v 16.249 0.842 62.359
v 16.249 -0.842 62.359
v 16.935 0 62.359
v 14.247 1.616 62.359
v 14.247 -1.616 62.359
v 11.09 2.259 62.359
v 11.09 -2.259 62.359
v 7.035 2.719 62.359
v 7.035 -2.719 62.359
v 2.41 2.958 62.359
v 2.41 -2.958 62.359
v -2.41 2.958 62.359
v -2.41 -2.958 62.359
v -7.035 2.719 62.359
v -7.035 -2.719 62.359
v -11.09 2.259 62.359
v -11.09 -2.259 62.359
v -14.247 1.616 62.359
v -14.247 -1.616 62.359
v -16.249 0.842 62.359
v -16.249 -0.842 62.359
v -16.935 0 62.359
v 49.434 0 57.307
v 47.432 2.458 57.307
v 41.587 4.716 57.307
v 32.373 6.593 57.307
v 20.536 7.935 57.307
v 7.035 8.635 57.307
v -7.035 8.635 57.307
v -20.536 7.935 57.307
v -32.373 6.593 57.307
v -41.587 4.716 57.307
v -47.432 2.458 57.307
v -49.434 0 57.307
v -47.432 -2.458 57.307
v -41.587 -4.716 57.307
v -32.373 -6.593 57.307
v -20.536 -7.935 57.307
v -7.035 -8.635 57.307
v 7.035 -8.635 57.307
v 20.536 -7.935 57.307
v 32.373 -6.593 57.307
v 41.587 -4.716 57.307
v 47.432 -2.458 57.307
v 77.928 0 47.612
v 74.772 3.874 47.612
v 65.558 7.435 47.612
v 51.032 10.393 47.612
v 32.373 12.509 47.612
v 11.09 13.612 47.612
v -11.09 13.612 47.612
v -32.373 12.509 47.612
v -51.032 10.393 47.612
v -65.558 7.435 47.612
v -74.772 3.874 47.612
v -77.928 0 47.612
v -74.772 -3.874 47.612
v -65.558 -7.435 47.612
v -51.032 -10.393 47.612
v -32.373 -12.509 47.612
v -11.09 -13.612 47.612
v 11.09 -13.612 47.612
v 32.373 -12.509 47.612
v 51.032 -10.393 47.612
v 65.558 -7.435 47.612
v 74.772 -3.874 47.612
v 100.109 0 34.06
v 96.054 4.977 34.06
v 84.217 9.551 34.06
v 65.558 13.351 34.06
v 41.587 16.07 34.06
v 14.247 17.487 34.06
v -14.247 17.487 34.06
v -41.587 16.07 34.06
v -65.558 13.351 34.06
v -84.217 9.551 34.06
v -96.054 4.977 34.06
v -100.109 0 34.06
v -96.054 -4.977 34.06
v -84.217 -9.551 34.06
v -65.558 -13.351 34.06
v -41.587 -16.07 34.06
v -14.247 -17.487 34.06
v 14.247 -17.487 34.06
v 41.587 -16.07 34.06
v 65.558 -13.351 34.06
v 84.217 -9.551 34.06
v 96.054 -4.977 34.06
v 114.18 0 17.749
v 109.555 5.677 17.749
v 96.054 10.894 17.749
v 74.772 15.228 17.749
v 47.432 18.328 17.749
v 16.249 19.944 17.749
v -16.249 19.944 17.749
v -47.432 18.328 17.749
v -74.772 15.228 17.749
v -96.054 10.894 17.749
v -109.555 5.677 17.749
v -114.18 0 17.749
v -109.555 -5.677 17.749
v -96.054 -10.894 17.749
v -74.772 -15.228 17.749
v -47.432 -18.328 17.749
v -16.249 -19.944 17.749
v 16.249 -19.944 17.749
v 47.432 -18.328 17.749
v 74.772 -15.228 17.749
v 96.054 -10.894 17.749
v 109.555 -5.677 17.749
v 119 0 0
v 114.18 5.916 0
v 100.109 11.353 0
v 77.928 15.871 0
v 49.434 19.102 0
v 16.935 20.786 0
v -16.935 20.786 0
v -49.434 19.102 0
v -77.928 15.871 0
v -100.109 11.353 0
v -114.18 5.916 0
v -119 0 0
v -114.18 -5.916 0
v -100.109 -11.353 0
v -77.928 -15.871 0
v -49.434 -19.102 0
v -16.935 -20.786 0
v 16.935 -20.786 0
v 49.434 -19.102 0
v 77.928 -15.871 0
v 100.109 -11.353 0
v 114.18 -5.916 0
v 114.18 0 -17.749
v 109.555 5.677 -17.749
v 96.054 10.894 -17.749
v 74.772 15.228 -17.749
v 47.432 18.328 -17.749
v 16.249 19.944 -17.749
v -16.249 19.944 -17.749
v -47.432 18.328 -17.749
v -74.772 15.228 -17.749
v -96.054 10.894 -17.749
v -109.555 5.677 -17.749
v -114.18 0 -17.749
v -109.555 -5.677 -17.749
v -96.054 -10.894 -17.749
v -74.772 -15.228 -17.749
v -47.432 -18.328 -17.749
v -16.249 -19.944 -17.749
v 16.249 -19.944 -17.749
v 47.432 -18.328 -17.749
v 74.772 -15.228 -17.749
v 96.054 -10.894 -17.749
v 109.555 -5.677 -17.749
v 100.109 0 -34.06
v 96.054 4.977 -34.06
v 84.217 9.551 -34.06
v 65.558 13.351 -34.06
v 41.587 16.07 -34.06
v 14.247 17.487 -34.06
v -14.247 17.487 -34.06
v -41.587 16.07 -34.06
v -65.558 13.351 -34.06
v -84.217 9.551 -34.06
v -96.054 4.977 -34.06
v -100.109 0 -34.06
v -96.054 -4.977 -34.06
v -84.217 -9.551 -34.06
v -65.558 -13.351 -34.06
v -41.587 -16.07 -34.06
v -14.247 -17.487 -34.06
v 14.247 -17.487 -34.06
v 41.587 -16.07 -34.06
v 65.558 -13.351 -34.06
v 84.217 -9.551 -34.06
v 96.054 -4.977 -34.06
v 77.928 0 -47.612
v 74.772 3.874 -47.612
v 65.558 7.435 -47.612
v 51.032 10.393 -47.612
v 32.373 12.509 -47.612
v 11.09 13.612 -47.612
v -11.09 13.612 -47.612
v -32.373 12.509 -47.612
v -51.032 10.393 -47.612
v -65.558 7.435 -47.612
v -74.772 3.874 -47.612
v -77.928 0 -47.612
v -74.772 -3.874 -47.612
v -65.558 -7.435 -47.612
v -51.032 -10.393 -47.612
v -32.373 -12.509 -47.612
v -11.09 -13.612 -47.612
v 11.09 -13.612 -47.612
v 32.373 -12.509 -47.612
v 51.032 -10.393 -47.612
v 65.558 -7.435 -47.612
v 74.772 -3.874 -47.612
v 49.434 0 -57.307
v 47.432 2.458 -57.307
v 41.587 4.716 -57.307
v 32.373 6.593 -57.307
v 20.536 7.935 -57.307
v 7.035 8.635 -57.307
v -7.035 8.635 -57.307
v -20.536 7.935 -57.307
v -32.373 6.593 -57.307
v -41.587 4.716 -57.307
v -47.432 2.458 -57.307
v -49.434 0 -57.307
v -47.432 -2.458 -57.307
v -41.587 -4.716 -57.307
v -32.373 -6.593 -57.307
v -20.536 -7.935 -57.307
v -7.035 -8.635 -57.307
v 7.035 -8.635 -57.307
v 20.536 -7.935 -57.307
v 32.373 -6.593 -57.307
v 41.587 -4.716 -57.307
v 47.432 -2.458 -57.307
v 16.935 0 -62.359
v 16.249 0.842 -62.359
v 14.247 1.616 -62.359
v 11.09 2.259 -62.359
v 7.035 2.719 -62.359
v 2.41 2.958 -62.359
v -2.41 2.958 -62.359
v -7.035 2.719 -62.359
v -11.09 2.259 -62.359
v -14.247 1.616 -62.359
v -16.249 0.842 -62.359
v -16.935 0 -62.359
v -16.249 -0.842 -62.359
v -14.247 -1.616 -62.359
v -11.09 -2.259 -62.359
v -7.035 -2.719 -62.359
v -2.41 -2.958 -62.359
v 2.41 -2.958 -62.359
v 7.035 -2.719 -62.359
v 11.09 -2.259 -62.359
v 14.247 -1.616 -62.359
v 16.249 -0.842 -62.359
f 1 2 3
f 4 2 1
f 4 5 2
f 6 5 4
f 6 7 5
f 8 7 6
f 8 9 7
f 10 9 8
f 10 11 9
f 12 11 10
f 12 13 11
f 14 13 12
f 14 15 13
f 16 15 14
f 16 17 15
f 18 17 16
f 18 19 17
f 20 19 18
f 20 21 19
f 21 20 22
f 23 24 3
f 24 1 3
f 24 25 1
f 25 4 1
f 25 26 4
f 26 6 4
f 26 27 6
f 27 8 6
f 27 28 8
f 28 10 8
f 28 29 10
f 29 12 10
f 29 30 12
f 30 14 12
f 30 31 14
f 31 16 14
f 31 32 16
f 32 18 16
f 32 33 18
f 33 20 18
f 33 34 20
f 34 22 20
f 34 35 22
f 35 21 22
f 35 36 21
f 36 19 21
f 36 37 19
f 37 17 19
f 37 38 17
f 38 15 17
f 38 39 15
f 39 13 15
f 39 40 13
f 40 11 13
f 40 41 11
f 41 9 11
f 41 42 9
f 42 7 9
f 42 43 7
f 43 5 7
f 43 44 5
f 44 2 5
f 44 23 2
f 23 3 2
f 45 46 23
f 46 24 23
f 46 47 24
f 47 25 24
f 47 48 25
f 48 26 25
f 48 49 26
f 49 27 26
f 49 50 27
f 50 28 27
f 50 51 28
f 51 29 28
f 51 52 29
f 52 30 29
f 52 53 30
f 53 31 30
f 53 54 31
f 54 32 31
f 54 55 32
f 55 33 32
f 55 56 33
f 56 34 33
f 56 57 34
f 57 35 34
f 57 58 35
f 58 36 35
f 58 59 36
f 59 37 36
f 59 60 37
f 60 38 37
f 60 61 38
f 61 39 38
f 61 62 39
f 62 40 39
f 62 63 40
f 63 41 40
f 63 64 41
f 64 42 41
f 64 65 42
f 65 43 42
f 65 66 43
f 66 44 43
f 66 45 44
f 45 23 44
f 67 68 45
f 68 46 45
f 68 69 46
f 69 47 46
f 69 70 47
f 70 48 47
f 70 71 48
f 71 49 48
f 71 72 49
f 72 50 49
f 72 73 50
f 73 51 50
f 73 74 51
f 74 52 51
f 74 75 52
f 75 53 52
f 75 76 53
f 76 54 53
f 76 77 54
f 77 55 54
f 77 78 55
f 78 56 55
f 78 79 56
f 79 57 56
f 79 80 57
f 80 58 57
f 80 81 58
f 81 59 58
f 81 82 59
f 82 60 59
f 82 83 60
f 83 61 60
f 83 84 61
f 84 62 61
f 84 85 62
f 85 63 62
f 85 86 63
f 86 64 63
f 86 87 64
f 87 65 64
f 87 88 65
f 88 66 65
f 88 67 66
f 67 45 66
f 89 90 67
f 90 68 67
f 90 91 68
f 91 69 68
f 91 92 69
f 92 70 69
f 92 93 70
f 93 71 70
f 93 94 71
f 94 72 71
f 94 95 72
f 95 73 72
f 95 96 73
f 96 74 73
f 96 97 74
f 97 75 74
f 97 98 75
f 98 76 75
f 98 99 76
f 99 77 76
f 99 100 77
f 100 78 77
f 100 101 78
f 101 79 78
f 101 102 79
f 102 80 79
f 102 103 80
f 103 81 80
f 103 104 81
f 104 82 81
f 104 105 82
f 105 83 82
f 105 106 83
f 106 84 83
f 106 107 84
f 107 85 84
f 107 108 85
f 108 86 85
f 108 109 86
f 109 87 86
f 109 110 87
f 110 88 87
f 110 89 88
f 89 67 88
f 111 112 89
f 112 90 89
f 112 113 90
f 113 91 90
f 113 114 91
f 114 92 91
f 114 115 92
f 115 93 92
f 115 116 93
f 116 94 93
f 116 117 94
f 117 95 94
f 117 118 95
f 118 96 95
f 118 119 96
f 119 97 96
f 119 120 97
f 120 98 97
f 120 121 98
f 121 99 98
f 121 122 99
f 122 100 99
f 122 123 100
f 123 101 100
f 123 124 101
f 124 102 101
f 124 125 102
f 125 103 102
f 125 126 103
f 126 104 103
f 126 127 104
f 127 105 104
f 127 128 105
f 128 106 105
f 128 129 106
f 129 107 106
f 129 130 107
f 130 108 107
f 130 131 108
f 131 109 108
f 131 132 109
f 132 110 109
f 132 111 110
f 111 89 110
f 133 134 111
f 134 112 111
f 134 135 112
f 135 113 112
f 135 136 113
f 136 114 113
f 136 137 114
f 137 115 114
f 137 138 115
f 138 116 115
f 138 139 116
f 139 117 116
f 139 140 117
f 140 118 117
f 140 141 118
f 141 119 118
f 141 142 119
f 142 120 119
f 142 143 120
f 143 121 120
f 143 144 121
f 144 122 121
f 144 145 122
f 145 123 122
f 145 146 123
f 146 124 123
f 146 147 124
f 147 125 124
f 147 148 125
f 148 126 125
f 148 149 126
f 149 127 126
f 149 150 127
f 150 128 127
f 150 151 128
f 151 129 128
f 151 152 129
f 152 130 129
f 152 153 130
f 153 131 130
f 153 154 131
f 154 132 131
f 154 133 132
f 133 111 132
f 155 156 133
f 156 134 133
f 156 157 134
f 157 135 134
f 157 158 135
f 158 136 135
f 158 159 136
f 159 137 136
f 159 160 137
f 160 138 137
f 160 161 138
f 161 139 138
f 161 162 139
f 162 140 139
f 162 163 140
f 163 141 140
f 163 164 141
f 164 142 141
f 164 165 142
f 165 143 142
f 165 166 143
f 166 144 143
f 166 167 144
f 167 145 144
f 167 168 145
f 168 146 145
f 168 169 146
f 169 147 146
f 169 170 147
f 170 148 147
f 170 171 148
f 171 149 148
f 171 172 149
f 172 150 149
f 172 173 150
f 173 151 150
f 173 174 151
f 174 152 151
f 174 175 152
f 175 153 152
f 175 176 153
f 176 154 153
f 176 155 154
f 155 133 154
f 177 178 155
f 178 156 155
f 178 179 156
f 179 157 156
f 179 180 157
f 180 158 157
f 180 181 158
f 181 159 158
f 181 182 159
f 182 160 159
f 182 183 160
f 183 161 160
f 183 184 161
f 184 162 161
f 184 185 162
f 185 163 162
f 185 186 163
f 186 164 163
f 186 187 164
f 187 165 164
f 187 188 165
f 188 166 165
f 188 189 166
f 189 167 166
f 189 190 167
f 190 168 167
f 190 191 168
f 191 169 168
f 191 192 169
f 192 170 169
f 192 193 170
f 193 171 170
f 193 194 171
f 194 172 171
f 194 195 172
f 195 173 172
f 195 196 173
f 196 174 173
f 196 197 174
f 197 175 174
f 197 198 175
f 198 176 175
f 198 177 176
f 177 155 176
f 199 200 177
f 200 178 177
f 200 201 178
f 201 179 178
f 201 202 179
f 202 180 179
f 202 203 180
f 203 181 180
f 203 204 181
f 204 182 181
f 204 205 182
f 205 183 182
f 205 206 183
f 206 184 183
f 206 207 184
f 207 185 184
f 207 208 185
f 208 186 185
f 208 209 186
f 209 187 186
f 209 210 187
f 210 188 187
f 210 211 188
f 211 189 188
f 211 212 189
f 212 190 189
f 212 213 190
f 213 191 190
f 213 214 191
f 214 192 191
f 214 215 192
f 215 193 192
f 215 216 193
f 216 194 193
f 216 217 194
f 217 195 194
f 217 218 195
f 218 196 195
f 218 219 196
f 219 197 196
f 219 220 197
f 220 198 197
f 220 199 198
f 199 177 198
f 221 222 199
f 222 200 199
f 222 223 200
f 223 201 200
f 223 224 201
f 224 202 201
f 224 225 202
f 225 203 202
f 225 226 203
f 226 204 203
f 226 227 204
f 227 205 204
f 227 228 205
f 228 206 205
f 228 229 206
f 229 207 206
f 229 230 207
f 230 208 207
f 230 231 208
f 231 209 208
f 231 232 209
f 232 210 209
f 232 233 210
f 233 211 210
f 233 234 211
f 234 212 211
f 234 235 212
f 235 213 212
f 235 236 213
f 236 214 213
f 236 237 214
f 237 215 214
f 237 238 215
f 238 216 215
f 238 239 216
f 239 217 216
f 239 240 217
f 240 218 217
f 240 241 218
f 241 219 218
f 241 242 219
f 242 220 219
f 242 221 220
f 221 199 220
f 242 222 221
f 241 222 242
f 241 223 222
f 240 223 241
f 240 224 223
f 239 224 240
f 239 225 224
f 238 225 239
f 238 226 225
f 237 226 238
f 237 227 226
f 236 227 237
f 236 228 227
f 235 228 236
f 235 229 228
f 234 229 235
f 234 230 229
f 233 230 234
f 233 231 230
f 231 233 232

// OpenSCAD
// Generated by SolidPython 1.0.1 on 2020-07-29 00:46:52


scale(v = [17, 3, 9]) {
	sphere(r = 7);
}
/***********************************************
*********      SolidPython code:      **********
************************************************
 
# import packages: SolidPython
from solid import *
from solid.utils import *
from itertools import chain, combinations, permutations


class Resize:

    def __init__(self, scad_file):
        self.scad_file = scad_file
        #self.scad_file = import_scad(scad_file)
        # cone/cylinder param:
        self.r1 = 0
        self.r2 = 0
        self.h = 0
        # rectangular prism param:
        self.w = 0
        self.l = 0
        # ellipse param:
        self.r = 0

    # import OpenScad code (file name corresponds to shape)


    # classify shape + parameters
    def assign(self, param1, param2, param3):
        if self.scad_file == 'cone.scad':
            self.r1 = param1
            self.r2 = param2
            self.h = param3
        elif self.scad_file == 'cylinder.scad':
            self.r1 = param1
            self.r2 = param2
            self.h = param3
        elif self.scad_file == 'rectangularPrism.scad':
            self.h = param1
            self.l = param2
            self.w = param3
        else:
            self.r = param1
            self.h = param2

    # resize parameters
    def iterate(self):
        x = range(3, 20, 2)
        i = 1
        if self.scad_file == 'cone.scad':
            tempList = list(permutations(x, 2))
            for temp in tempList:
                param1 = temp[0]
                param2 = temp[1]
                filepath = 'produced_scad_files/' + 'cone' + str(param1) + '_' + str(param2) + '_' + '.scad'
                scad_render_to_file(cylinder(h=param1, r1=param2, r2=0), filepath)

        elif self.scad_file == 'cylinder.scad':
            tempList = list(permutations(x, 3))
            for temp in tempList:
                param1 = temp[0]
                param2 = temp[1]
                filepath = 'produced_scad_files/' + 'cylinder' + str(param1) + '_' + str(param2) + '_' + '.scad'
                scad_render_to_file(cylinder(h=param1, r1=param2, r2=param2), filepath)

        elif self.scad_file == 'rectangularPrism.scad':
            tempList = list(permutations(x, 3))
            for temp in tempList:
                param1 = temp[0]
                param2 = temp[1]
                param3 = temp[2]
                filepath = 'produced_scad_files/' + 'rectangularPrism' + str(param1) + '_' + str(param2) + '_' + str(
                    param3) + '.scad'
                scad_render_to_file(cube(size=(param1, param2, param3)), filepath)

        elif self.scad_file == 'ellipse.scad':
            tempList = list(permutations(x, 4))
            for temp in tempList:
                param1 = temp[0]
                param2 = temp[1]
                param3 = temp[2]
                param4 = temp[3]
                filepath = 'produced_scad_files/' + 'ellipse' + str(param1) + '_' + str(param2) + '_' + str(param3) + '_' + str(param4) + '.scad'
                scad_render_to_file(scale([param1, param2, param3])(sphere(r=param4)), filepath)

    def render_to_scadfile(self):
        scad_render_to_file(scad, 'example.scad') 
 
************************************************/
